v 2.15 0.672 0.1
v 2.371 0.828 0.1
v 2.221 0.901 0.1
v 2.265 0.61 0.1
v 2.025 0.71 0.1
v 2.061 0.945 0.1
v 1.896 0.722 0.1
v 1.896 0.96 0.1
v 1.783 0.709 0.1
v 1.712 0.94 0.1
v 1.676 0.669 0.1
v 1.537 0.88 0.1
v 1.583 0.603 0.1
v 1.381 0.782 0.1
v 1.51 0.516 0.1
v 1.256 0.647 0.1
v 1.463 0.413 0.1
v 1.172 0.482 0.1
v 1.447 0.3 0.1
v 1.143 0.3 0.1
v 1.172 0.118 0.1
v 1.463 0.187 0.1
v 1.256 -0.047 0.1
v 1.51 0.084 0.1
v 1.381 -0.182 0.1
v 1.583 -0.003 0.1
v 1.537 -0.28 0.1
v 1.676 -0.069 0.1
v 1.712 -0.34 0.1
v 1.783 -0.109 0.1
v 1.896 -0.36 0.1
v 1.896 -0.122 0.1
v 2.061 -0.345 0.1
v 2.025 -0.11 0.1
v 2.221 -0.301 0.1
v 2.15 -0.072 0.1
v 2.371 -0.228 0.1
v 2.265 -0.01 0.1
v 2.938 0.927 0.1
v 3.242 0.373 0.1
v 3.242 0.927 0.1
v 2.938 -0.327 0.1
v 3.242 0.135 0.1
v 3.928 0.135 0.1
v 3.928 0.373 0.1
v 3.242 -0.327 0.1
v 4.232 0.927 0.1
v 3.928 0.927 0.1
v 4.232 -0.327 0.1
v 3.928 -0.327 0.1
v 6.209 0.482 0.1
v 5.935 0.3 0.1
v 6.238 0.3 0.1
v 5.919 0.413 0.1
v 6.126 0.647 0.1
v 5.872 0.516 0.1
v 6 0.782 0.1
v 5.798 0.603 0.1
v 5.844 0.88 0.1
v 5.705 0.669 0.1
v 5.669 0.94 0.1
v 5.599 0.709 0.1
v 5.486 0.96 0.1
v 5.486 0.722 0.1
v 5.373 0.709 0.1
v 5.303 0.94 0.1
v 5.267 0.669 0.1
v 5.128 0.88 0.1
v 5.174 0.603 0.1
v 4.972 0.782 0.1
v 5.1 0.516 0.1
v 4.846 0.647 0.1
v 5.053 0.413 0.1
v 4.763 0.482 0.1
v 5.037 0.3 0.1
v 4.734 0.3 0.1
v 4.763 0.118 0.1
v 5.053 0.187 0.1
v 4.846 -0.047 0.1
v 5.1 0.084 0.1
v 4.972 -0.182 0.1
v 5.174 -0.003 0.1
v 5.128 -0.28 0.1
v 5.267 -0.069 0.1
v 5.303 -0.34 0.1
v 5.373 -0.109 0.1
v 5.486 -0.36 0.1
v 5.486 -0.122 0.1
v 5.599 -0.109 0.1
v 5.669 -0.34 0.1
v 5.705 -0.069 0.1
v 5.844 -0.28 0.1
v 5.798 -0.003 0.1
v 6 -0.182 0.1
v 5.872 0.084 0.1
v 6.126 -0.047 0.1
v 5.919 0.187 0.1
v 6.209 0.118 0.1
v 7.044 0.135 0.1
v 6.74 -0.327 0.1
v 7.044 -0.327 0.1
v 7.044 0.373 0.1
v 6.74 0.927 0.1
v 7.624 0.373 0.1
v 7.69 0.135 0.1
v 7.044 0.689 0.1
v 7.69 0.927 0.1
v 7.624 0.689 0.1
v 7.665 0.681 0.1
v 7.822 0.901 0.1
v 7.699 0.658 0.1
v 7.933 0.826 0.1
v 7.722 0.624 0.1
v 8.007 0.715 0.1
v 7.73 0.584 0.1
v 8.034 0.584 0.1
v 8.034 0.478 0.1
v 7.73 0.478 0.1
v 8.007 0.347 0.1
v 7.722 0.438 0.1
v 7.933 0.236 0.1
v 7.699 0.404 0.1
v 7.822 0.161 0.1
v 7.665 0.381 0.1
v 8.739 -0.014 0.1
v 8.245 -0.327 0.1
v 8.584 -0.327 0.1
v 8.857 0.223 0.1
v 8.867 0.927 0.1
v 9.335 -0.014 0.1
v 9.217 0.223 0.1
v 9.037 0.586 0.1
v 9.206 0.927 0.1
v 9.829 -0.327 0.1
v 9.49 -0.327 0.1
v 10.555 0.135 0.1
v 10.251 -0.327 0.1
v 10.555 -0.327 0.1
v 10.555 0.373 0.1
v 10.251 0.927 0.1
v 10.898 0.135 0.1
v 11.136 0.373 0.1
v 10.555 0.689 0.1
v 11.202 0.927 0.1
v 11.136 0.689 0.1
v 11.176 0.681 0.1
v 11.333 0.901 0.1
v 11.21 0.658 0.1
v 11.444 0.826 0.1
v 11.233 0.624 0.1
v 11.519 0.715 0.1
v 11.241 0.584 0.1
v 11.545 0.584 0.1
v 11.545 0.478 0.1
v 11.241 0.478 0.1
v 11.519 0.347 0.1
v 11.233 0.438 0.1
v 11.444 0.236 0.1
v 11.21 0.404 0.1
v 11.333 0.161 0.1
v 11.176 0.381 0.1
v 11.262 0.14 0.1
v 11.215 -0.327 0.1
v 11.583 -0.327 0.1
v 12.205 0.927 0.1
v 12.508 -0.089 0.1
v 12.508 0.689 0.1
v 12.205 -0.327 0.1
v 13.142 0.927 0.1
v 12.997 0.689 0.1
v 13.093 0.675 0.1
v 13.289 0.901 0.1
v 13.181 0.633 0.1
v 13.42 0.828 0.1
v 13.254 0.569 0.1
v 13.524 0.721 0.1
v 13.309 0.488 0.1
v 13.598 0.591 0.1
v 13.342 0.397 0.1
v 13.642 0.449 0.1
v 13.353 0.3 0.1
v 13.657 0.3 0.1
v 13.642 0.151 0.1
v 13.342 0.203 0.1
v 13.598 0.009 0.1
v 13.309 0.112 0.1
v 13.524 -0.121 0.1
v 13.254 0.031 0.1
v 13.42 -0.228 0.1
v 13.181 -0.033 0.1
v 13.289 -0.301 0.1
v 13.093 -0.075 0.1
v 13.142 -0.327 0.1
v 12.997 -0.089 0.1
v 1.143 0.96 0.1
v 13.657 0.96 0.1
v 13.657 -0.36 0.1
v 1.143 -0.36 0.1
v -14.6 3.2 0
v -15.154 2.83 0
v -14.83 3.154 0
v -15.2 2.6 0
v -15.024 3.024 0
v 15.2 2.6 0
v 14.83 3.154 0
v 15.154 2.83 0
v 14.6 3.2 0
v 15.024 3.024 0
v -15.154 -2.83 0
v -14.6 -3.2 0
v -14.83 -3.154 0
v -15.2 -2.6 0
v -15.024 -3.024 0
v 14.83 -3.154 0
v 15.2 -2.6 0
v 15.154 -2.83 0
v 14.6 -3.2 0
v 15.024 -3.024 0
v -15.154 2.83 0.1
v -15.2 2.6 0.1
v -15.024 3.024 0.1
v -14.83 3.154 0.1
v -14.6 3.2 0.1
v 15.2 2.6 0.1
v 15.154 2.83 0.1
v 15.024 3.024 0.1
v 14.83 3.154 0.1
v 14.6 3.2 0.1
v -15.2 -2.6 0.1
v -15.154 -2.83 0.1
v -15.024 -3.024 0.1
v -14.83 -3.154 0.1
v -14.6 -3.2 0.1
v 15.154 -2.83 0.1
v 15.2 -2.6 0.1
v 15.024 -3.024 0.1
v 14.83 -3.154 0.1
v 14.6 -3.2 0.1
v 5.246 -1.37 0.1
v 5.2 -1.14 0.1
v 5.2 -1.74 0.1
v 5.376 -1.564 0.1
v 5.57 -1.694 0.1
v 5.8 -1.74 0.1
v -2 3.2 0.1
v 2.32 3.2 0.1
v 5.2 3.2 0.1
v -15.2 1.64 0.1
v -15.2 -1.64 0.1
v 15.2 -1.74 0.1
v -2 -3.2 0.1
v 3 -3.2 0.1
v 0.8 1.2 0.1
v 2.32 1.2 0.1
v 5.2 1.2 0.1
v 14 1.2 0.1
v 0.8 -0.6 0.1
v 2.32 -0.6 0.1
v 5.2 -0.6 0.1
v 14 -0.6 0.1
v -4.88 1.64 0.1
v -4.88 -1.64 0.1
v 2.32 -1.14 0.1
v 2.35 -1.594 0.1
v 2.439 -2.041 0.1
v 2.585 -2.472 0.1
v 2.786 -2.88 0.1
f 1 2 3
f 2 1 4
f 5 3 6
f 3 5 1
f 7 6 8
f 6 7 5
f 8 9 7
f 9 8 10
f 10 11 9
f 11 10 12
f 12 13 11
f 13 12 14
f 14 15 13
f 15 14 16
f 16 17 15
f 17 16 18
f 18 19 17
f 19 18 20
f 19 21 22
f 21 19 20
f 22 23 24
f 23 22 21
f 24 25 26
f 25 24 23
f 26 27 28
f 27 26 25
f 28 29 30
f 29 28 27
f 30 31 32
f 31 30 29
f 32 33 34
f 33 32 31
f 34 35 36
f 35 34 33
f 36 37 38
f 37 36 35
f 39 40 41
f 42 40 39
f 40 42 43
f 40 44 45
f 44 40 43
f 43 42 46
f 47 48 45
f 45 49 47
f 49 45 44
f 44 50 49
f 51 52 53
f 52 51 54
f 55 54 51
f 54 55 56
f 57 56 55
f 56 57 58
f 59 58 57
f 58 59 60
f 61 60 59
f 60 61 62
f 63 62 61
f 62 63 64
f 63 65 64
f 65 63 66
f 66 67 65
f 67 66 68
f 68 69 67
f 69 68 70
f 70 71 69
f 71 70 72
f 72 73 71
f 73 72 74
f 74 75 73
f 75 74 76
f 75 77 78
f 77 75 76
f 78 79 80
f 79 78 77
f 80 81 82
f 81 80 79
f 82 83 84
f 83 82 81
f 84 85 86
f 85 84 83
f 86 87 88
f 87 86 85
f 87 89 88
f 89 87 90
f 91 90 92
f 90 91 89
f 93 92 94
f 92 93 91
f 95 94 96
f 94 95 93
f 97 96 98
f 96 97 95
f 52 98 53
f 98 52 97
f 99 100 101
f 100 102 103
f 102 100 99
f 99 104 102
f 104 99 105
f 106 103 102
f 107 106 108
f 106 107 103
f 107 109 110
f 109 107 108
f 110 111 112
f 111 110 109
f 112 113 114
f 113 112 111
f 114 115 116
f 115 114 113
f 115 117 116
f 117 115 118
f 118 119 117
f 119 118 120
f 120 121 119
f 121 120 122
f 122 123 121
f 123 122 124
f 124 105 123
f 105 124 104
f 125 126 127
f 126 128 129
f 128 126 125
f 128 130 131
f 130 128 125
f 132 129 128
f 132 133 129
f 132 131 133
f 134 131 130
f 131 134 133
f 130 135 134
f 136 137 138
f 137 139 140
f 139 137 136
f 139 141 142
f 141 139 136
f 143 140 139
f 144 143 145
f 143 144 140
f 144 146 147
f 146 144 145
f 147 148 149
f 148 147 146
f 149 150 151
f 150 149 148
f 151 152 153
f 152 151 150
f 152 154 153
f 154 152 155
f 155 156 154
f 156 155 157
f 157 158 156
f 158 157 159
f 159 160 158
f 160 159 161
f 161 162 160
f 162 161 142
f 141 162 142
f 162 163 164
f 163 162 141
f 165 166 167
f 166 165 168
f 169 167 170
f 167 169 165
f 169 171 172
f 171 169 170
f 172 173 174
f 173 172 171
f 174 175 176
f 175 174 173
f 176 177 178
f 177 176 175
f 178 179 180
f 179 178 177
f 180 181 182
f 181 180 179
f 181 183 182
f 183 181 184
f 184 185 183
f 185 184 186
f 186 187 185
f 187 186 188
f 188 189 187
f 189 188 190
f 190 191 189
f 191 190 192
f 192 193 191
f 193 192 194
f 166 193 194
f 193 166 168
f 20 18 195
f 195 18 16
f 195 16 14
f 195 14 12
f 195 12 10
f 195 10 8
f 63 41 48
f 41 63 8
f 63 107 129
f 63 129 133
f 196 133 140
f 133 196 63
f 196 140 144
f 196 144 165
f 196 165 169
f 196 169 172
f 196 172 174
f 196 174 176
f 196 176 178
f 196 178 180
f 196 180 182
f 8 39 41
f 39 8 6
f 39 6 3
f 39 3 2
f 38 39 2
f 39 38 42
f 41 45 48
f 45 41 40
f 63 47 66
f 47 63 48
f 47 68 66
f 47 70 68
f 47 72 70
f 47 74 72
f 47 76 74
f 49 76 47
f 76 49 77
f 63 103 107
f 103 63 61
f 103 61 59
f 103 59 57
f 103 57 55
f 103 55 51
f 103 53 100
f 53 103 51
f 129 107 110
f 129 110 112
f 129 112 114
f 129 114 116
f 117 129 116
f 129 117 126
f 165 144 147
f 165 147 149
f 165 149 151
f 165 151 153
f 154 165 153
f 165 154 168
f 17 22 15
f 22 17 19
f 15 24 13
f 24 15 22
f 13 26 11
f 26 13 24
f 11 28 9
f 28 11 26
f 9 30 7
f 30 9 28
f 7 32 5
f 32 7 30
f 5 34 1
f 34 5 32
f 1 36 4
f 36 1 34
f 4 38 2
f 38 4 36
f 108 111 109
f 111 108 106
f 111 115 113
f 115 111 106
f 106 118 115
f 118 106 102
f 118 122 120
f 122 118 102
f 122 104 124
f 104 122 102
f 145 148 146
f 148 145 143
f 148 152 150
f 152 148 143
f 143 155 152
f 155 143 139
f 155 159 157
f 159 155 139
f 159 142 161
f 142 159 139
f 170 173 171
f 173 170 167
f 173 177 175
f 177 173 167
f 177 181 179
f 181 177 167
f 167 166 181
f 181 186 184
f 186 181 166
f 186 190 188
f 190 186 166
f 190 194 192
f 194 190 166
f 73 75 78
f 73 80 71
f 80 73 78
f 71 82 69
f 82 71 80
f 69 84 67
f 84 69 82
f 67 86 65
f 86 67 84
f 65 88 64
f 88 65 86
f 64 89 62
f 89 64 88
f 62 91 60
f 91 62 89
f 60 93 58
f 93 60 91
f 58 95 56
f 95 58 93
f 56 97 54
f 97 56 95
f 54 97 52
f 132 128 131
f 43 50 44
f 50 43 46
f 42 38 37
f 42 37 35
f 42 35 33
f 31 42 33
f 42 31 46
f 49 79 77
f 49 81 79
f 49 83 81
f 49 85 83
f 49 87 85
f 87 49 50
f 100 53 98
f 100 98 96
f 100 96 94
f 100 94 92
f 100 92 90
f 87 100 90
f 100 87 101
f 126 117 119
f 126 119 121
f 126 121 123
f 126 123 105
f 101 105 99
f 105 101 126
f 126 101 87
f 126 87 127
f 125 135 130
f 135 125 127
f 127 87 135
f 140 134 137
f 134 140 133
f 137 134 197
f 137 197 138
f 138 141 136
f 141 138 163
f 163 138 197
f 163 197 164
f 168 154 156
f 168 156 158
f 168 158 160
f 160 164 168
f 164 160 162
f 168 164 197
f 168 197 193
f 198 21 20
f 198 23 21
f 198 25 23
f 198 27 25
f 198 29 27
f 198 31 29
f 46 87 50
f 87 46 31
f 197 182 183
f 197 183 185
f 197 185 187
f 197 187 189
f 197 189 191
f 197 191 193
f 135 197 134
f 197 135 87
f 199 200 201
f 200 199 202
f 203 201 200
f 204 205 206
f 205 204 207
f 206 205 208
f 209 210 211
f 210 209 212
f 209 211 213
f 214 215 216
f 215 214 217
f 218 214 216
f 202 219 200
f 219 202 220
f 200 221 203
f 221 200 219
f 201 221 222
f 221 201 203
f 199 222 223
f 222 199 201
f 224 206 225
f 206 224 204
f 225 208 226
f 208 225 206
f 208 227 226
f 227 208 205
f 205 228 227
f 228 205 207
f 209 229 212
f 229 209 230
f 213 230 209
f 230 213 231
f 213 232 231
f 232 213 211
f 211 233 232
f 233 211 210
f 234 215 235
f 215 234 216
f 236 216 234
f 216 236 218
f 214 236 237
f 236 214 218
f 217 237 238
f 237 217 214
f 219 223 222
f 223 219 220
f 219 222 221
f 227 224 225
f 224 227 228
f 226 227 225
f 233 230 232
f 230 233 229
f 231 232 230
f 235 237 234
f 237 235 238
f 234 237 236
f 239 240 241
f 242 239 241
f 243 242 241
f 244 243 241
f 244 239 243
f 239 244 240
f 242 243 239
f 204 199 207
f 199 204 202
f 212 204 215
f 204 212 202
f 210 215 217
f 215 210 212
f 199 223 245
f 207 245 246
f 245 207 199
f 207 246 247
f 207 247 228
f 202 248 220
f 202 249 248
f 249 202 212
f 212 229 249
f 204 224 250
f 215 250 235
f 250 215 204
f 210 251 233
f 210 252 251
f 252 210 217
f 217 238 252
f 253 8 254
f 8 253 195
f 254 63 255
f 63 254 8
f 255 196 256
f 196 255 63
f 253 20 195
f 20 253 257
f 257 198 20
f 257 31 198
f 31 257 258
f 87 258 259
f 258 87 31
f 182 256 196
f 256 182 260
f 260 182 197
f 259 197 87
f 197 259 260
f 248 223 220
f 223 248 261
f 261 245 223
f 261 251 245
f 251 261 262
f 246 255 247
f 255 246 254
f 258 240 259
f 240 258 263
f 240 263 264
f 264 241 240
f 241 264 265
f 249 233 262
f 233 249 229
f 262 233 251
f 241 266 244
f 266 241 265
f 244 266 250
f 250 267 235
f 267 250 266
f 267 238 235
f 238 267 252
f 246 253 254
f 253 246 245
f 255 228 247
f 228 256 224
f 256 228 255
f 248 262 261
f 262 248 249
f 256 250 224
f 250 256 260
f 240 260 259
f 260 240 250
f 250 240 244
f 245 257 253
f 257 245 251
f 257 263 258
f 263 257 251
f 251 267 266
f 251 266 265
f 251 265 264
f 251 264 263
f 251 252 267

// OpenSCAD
// file: ../p/1-4ndis.scad
use <../lib.scad>
function ldraw_lib__1_4ndis() = [
// 0 Disc Negative 0.25
// 0 Name: 1-4ndis.dat
// 0 Author: James Jessiman
// 0 !LDRAW_ORG Primitive UPDATE 2012-01
// 0 !LICENSE Licensed under CC BY 4.0 : see CAreadme.txt
// 
// 0 BFC CERTIFY CCW
  [0,"BFC","CERTIFY"],
  [0,"BFC","CCW"],
// 
// 0 !HISTORY 2002-03-23 [sbliss] Added BFC Statement
// 0 !HISTORY 2002-04-25 [PTadmin] Official Update 2002-02
// 0 !HISTORY 2007-06-22 [PTadmin] Header formatted for Contributor Agreement
// 0 !HISTORY 2008-07-01 [PTadmin] Official Update 2008-01
// 0 !HISTORY 2012-02-16 [Philo] Changed to CCW
// 0 !HISTORY 2012-03-30 [PTadmin] Official Update 2012-01
// 
// 
// 3 16 0.9239 0 0.3827 1 0 0 1 0 1
  [3,16,0.9239,0,0.3827,1,0,0,1,0,1],
// 3 16 0.7071 0 0.7071 0.9239 0 0.3827 1 0 1
  [3,16,0.7071,0,0.7071,0.9239,0,0.3827,1,0,1],
// 3 16 0.3827 0 0.9239 0.7071 0 0.7071 1 0 1
  [3,16,0.3827,0,0.9239,0.7071,0,0.7071,1,0,1],
// 3 16 0 0 1 0.3827 0 0.9239 1 0 1
  [3,16,0,0,1,0.3827,0,0.9239,1,0,1],
];
module ldraw_lib__1_4ndis(step=0, col=false, unit=2/5, alt=false, line=0.2, solid=!$preview)
    makepoly(ldraw_lib__1_4ndis(), step=step, col=col, unit=unit, alt=alt, line=line, solid=solid);
ldraw_lib__1_4ndis(line=0.2);
// file: ../p/1-4cyli.scad
use <../lib.scad>
function ldraw_lib__1_4cyli() = [
// 0 Cylinder 0.25
// 0 Name: 1-4cyli.dat
// 0 Author: James Jessiman
// 0 !LDRAW_ORG Primitive UPDATE 2012-01
// 0 !LICENSE Licensed under CC BY 4.0 : see CAreadme.txt
// 
// 0 BFC CERTIFY CCW
  [0,"BFC","CERTIFY"],
  [0,"BFC","CCW"],
// 
// 0 !HISTORY 2002-03-23 [sbliss] Added BFC statement.
// 0 !HISTORY 2002-04-25 [PTadmin] Official Update 2002-02
// 0 !HISTORY 2007-06-22 [PTadmin] Header formatted for Contributor Agreement
// 0 !HISTORY 2008-07-01 [PTadmin] Official Update 2008-01
// 0 !HISTORY 2012-02-16 [Philo] Changed to CCW
// 0 !HISTORY 2012-03-30 [PTadmin] Official Update 2012-01
// 
// 
// 4 16 1 1 0 0.9239 1 0.3827 0.9239 0 0.3827 1 0 0
  [4,16,1,1,0,0.9239,1,0.3827,0.9239,0,0.3827,1,0,0],
// 5 24 1 0 0 1 1 0 0.9239 0 0.3827 1 0 -1
  [5,24,1,0,0,1,1,0,0.9239,0,0.3827,1,0,-1],
// 4 16 0.9239 1 0.3827 0.7071 1 0.7071 0.7071 0 0.7071 0.9239 0 0.3827
  [4,16,0.9239,1,0.3827,0.7071,1,0.7071,0.7071,0,0.7071,0.9239,0,0.3827],
// 5 24 0.9239 0 0.3827 0.9239 1 0.3827 0.7071 0 0.7071 1 0 0
  [5,24,0.9239,0,0.3827,0.9239,1,0.3827,0.7071,0,0.7071,1,0,0],
// 4 16 0.7071 1 0.7071 0.3827 1 0.9239 0.3827 0 0.9239 0.7071 0 0.7071
  [4,16,0.7071,1,0.7071,0.3827,1,0.9239,0.3827,0,0.9239,0.7071,0,0.7071],
// 5 24 0.7071 0 0.7071 0.7071 1 0.7071 0.3827 0 0.9239 0.9239 0 0.3827
  [5,24,0.7071,0,0.7071,0.7071,1,0.7071,0.3827,0,0.9239,0.9239,0,0.3827],
// 4 16 0.3827 1 0.9239 0 1 1 0 0 1 0.3827 0 0.9239
  [4,16,0.3827,1,0.9239,0,1,1,0,0,1,0.3827,0,0.9239],
// 5 24 0.3827 0 0.9239 0.3827 1 0.9239 0 0 1 0.7071 0 0.7071
  [5,24,0.3827,0,0.9239,0.3827,1,0.9239,0,0,1,0.7071,0,0.7071],
// 5 24 0 0 1 0 1 1 0.3827 0 0.9239 -1 0 1
  [5,24,0,0,1,0,1,1,0.3827,0,0.9239,-1,0,1],
];
module ldraw_lib__1_4cyli(step=0, col=false, unit=2/5, alt=false, line=0.2, solid=!$preview)
    makepoly(ldraw_lib__1_4cyli(), step=step, col=col, unit=unit, alt=alt, line=line, solid=solid);
ldraw_lib__1_4cyli(line=0.2);
// file: ../p/1-4chrd.scad
use <../lib.scad>
function ldraw_lib__1_4chrd() = [
// 0 Chord 0.25
// 0 Name: 1-4chrd.dat
// 0 Author: Max Martin Richter [MMR1988]
// 0 !LDRAW_ORG Primitive UPDATE 2023-05
// 0 !LICENSE Licensed under CC BY 4.0 : see CAreadme.txt
// 
// 0 BFC CERTIFY CCW
  [0,"BFC","CERTIFY"],
  [0,"BFC","CCW"],
// 
// 0 !HISTORY 2004-04-22 [PTadmin] Official Update 2004-02
// 0 !HISTORY 2007-10-09 [PTadmin] Header formatted for Contributor Agreement
// 0 !HISTORY 2008-07-01 [PTadmin] Official Update 2008-01
// 0 !HISTORY 2012-08-02 [MMR1988] Re-creation with PrimGen2 and Rectifier
// 0 !HISTORY 2012-08-09 [PTadmin] Official Update 2012-02
// 0 !HISTORY 2023-10-27 [OrionP] Change author to MMR1988 from hafhead
// 0 !HISTORY 2023-10-31 [OrionP] Official Update 2023-05
// 
// 4 16 0.9239 0 0.3827 0.3827 0 0.9239 0 0 1 1 0 0
  [4,16,0.9239,0,0.3827,0.3827,0,0.9239,0,0,1,1,0,0],
// 3 16 0.7071 0 0.7071 0.3827 0 0.9239 0.9239 0 0.3827
  [3,16,0.7071,0,0.7071,0.3827,0,0.9239,0.9239,0,0.3827],
];
module ldraw_lib__1_4chrd(step=0, col=false, unit=2/5, alt=false, line=0.2, solid=!$preview)
    makepoly(ldraw_lib__1_4chrd(), step=step, col=col, unit=unit, alt=alt, line=line, solid=solid);
ldraw_lib__1_4chrd(line=0.2);
// main file
use <../lib.scad>
use <../p/1-4chrd.scad>
use <../p/1-4cyli.scad>
use <../p/1-4ndis.scad>
use <../p/logo-chopard-box.scad>
use <../p/logo-chopard-text.scad>
function ldraw_lib__6148328an() = [
// 0 Sticker  0.8 x  3.8 with White "CHOPARD" and Dark Grey Lines on White Background Right
// 0 Name: 6148328an.dat
// 0 Author: Massimo Maso [Sirio]
// 0 !LDRAW_ORG Part UPDATE 2024-08
// 0 !LICENSE Licensed under CC BY 4.0 : see CAreadme.txt
// 
// 0 BFC CERTIFY CCW
  [0,"BFC","CERTIFY"],
  [0,"BFC","CCW"],
// 
// 0 !KEYWORDS 919, Bricklink 75876stk01, Brickowl 852010, Hybrid, Pit Lane
// 0 !KEYWORDS Porsche, Rebrickable 26357, set 75876, Speed Champions
// 
// 0 !HISTORY 2024-09-30 [OrionP] Official Update 2024-08
// 
// 0 // Logo primitives
// 1 15 18.5 -.25 .75 .33 0 0 0 1 0 0 0 .33 logo-chopard-text.dat
  [1,15,18.5,-.25,.75,.33,0,0,0,1,0,0,0,.33, ldraw_lib__logo_chopard_text()],
// 1 0 18.5 -.25 .75 .33 0 0 0 1 0 0 0 .33 logo-chopard-box.dat
  [1,0,18.5,-.25,.75,.33,0,0,0,1,0,0,0,.33, ldraw_lib__logo_chopard_box()],
// 0 // Primitives
// 1 16 -36.5 0 6.5 -1.5 0 0 0 -1 0 0 0 1.5 1-4chrd.dat
  [1,16,-36.5,0,6.5,-1.5,0,0,0,-1,0,0,0,1.5, ldraw_lib__1_4chrd()],
// 1 16 36.5 0 6.5 1.5 0 0 0 -1 0 0 0 1.5 1-4chrd.dat
  [1,16,36.5,0,6.5,1.5,0,0,0,-1,0,0,0,1.5, ldraw_lib__1_4chrd()],
// 1 16 -36.5 0 -6.5 -1.5 0 0 0 -1 0 0 0 -1.5 1-4chrd.dat
  [1,16,-36.5,0,-6.5,-1.5,0,0,0,-1,0,0,0,-1.5, ldraw_lib__1_4chrd()],
// 1 16 36.5 0 -6.5 1.5 0 0 0 -1 0 0 0 -1.5 1-4chrd.dat
  [1,16,36.5,0,-6.5,1.5,0,0,0,-1,0,0,0,-1.5, ldraw_lib__1_4chrd()],
// 1 16 -36.5 0 6.5 -1.5 0 0 0 -.25 0 0 0 1.5 1-4cyli.dat
  [1,16,-36.5,0,6.5,-1.5,0,0,0,-.25,0,0,0,1.5, ldraw_lib__1_4cyli()],
// 1 16 36.5 0 6.5 1.5 0 0 0 -.25 0 0 0 1.5 1-4cyli.dat
  [1,16,36.5,0,6.5,1.5,0,0,0,-.25,0,0,0,1.5, ldraw_lib__1_4cyli()],
// 1 16 -36.5 0 -6.5 -1.5 0 0 0 -.25 0 0 0 -1.5 1-4cyli.dat
  [1,16,-36.5,0,-6.5,-1.5,0,0,0,-.25,0,0,0,-1.5, ldraw_lib__1_4cyli()],
// 1 16 36.5 0 -6.5 1.5 0 0 0 -.25 0 0 0 -1.5 1-4cyli.dat
  [1,16,36.5,0,-6.5,1.5,0,0,0,-.25,0,0,0,-1.5, ldraw_lib__1_4cyli()],
// 1 72 -36.5 -.25 6.5 -1.5 0 0 0 1 0 0 0 1.5 1-4chrd.dat
  [1,72,-36.5,-.25,6.5,-1.5,0,0,0,1,0,0,0,1.5, ldraw_lib__1_4chrd()],
// 1 15 36.5 -.25 6.5 1.5 0 0 0 1 0 0 0 1.5 1-4chrd.dat
  [1,15,36.5,-.25,6.5,1.5,0,0,0,1,0,0,0,1.5, ldraw_lib__1_4chrd()],
// 1 72 -36.5 -.25 -6.5 -1.5 0 0 0 1 0 0 0 -1.5 1-4chrd.dat
  [1,72,-36.5,-.25,-6.5,-1.5,0,0,0,1,0,0,0,-1.5, ldraw_lib__1_4chrd()],
// 1 72 36.5 -.25 -6.5 1.5 0 0 0 1 0 0 0 -1.5 1-4chrd.dat
  [1,72,36.5,-.25,-6.5,1.5,0,0,0,1,0,0,0,-1.5, ldraw_lib__1_4chrd()],
// 1 72 14.5 -.25 -2.85 -1.5 0 0 0 1 0 0 0 -1.5 1-4ndis.dat
  [1,72,14.5,-.25,-2.85,-1.5,0,0,0,1,0,0,0,-1.5, ldraw_lib__1_4ndis()],
// 1 15 14.5 -.25 -2.85 -1.5 0 0 0 1 0 0 0 -1.5 1-4chrd.dat
  [1,15,14.5,-.25,-2.85,-1.5,0,0,0,1,0,0,0,-1.5, ldraw_lib__1_4chrd()],
// 0 // Bottom faces
// 4 16 36.5 0 8 38 0 6.5 -38 0 6.5 -36.5 0 8
  [4,16,36.5,0,8,38,0,6.5,-38,0,6.5,-36.5,0,8],
// 4 16 38 0 6.5 38 0 -6.5 -38 0 -6.5 -38 0 6.5
  [4,16,38,0,6.5,38,0,-6.5,-38,0,-6.5,-38,0,6.5],
// 4 16 36.5 0 -8 -36.5 0 -8 -38 0 -6.5 38 0 -6.5
  [4,16,36.5,0,-8,-36.5,0,-8,-38,0,-6.5,38,0,-6.5],
// 0 // Lateral faces
// 3 16 -36.5 0 8 -36.5 -.25 8 -5 -.25 8
  [3,16,-36.5,0,8,-36.5,-.25,8,-5,-.25,8],
// 4 16 -36.5 0 8 -5 -.25 8 5.8 -.25 8 36.5 0 8
  [4,16,-36.5,0,8,-5,-.25,8,5.8,-.25,8,36.5,0,8],
// 3 16 36.5 0 8 5.8 -.25 8 13 -.25 8
  [3,16,36.5,0,8,5.8,-.25,8,13,-.25,8],
// 3 16 36.5 0 8 13 -.25 8 36.5 -.25 8
  [3,16,36.5,0,8,13,-.25,8,36.5,-.25,8],
// 3 16 -38 0 6.5 -38 -.25 4.1 -38 -.25 6.5
  [3,16,-38,0,6.5,-38,-.25,4.1,-38,-.25,6.5],
// 4 16 -38 0 6.5 -38 0 -6.5 -38 -.25 -4.1 -38 -.25 4.1
  [4,16,-38,0,6.5,-38,0,-6.5,-38,-.25,-4.1,-38,-.25,4.1],
// 3 16 -38 0 -6.5 -38 -.25 -6.5 -38 -.25 -4.1
  [3,16,-38,0,-6.5,-38,-.25,-6.5,-38,-.25,-4.1],
// 3 16 38 0 6.5 38 -.25 6.5 38 -.25 -4.35
  [3,16,38,0,6.5,38,-.25,6.5,38,-.25,-4.35],
// 4 16 38 0 6.5 38 -.25 -4.35 38 -.25 -6.5 38 0 -6.5
  [4,16,38,0,6.5,38,-.25,-4.35,38,-.25,-6.5,38,0,-6.5],
// 3 16 -36.5 0 -8 -5 -.25 -8 -36.5 -.25 -8
  [3,16,-36.5,0,-8,-5,-.25,-8,-36.5,-.25,-8],
// 4 16 -36.5 0 -8 36.5 0 -8 7.4996 -.25 -8 -5 -.25 -8
  [4,16,-36.5,0,-8,36.5,0,-8,7.4996,-.25,-8,-5,-.25,-8],
// 3 16 36.5 0 -8 36.5 -.25 -8 7.4996 -.25 -8
  [3,16,36.5,0,-8,36.5,-.25,-8,7.4996,-.25,-8],
// 0 // Top faces
// 0 // Black frame
// 4 0 5.8 -.25 3 2 -.25 3 2.858 -.25 2.4 4.739 -.25 2.4
  [4,0,5.8,-.25,3,2,-.25,3,2.858,-.25,2.4,4.739,-.25,2.4],
// 4 0 5.8 -.25 3 4.739 -.25 2.4 13.715 -.25 2.4 13 -.25 3
  [4,0,5.8,-.25,3,4.739,-.25,2.4,13.715,-.25,2.4,13,-.25,3],
// 4 0 13 -.25 3 13.715 -.25 2.4 34.142 -.25 2.4 35 -.25 3
  [4,0,13,-.25,3,13.715,-.25,2.4,34.142,-.25,2.4,35,-.25,3],
// 4 0 2 -.25 -1.5 2.858 -.25 .75 2.858 -.25 2.4 2 -.25 3
  [4,0,2,-.25,-1.5,2.858,-.25,.75,2.858,-.25,2.4,2,-.25,3],
// 3 0 2 -.25 -1.5 2.858 -.25 -.9 2.858 -.25 .75
  [3,0,2,-.25,-1.5,2.858,-.25,-.9,2.858,-.25,.75],
// 4 0 2 -.25 -1.5 5.8 -.25 -1.5 4.739 -.25 -.9 2.858 -.25 -.9
  [4,0,2,-.25,-1.5,5.8,-.25,-1.5,4.739,-.25,-.9,2.858,-.25,-.9],
// 4 0 5.8 -.25 -1.5 13 -.25 -1.5 13.715 -.25 -.9 4.739 -.25 -.9
  [4,0,5.8,-.25,-1.5,13,-.25,-1.5,13.715,-.25,-.9,4.739,-.25,-.9],
// 4 0 35 -.25 -1.5 35 -.25 3 34.142 -.25 2.4 34.142 -.25 .75
  [4,0,35,-.25,-1.5,35,-.25,3,34.142,-.25,2.4,34.142,-.25,.75],
// 3 0 35 -.25 -1.5 34.142 -.25 .75 34.142 -.25 -.9
  [3,0,35,-.25,-1.5,34.142,-.25,.75,34.142,-.25,-.9],
// 4 0 35 -.25 -1.5 34.142 -.25 -.9 13.715 -.25 -.9 13 -.25 -1.5
  [4,0,35,-.25,-1.5,34.142,-.25,-.9,13.715,-.25,-.9,13,-.25,-1.5],
// 0 // Dark grey faces
// 4 72 -12.2 -.25 4.1 -36.5 -.25 8 -38 -.25 6.5 -38 -.25 4.1
  [4,72,-12.2,-.25,4.1,-36.5,-.25,8,-38,-.25,6.5,-38,-.25,4.1],
// 3 72 -12.2 -.25 4.1 -5 -.25 8 -36.5 -.25 8
  [3,72,-12.2,-.25,4.1,-5,-.25,8,-36.5,-.25,8],
// 4 72 -12.2 -.25 4.1 -12.2 -.25 -4.1 -5 -.25 -8 -5 -.25 8
  [4,72,-12.2,-.25,4.1,-12.2,-.25,-4.1,-5,-.25,-8,-5,-.25,8],
// 4 72 5.8 -.25 3 13 -.25 3 13 -.25 8 5.8 -.25 8
  [4,72,5.8,-.25,3,13,-.25,3,13,-.25,8,5.8,-.25,8],
// 4 72 13 -.25 -2.85 13 -.25 -1.5 5.8 -.25 -1.5 5.8 -.25 -2.85
  [4,72,13,-.25,-2.85,13,-.25,-1.5,5.8,-.25,-1.5,5.8,-.25,-2.85],
// 3 72 13 -.25 -2.85 5.8 -.25 -2.85 5.8748 -.25 -3.9854
  [3,72,13,-.25,-2.85,5.8,-.25,-2.85,5.8748,-.25,-3.9854],
// 4 72 13 -.25 -2.85 5.8748 -.25 -3.9854 6.0967 -.25 -5.1016 13 -.25 -4.35
  [4,72,13,-.25,-2.85,5.8748,-.25,-3.9854,6.0967,-.25,-5.1016,13,-.25,-4.35],
// 4 72 -12.2 -.25 -4.1 -38 -.25 -4.1 -38 -.25 -6.5 -36.5 -.25 -8
  [4,72,-12.2,-.25,-4.1,-38,-.25,-4.1,-38,-.25,-6.5,-36.5,-.25,-8],
// 3 72 -12.2 -.25 -4.1 -36.5 -.25 -8 -5 -.25 -8
  [3,72,-12.2,-.25,-4.1,-36.5,-.25,-8,-5,-.25,-8],
// 4 72 14.5 -.25 -4.35 13 -.25 -4.35 6.0967 -.25 -5.1016 6.4621 -.25 -6.1795
  [4,72,14.5,-.25,-4.35,13,-.25,-4.35,6.0967,-.25,-5.1016,6.4621,-.25,-6.1795],
// 3 72 14.5 -.25 -4.35 6.4621 -.25 -6.1795 38 -.25 -4.35
  [3,72,14.5,-.25,-4.35,6.4621,-.25,-6.1795,38,-.25,-4.35],
// 4 72 38 -.25 -6.5 38 -.25 -4.35 6.4621 -.25 -6.1795 6.9658 -.25 -7.2
  [4,72,38,-.25,-6.5,38,-.25,-4.35,6.4621,-.25,-6.1795,6.9658,-.25,-7.2],
// 4 72 38 -.25 -6.5 6.9658 -.25 -7.2 7.4996 -.25 -8 36.5 -.25 -8
  [4,72,38,-.25,-6.5,6.9658,-.25,-7.2,7.4996,-.25,-8,36.5,-.25,-8],
// 0 // White faces
// 4 15 5.8 -.25 3 5.8 -.25 8 -5 -.25 8 2 -.25 3
  [4,15,5.8,-.25,3,5.8,-.25,8,-5,-.25,8,2,-.25,3],
// 3 15 13 -.25 3 36.5 -.25 8 13 -.25 8
  [3,15,13,-.25,3,36.5,-.25,8,13,-.25,8],
// 4 15 13 -.25 3 35 -.25 3 38 -.25 6.5 36.5 -.25 8
  [4,15,13,-.25,3,35,-.25,3,38,-.25,6.5,36.5,-.25,8],
// 4 15 -12.2 -.25 4.1 -38 -.25 4.1 -38 -.25 -4.1 -12.2 -.25 -4.1
  [4,15,-12.2,-.25,4.1,-38,-.25,4.1,-38,-.25,-4.1,-12.2,-.25,-4.1],
// 4 15 38 -.25 -4.35 38 -.25 6.5 35 -.25 3 35 -.25 -1.5
  [4,15,38,-.25,-4.35,38,-.25,6.5,35,-.25,3,35,-.25,-1.5],
// 4 15 38 -.25 -4.35 35 -.25 -1.5 13 -.25 -1.5 13 -.25 -2.85
  [4,15,38,-.25,-4.35,35,-.25,-1.5,13,-.25,-1.5,13,-.25,-2.85],
// 3 15 38 -.25 -4.35 13 -.25 -2.85 14.5 -.25 -4.35
  [3,15,38,-.25,-4.35,13,-.25,-2.85,14.5,-.25,-4.35],
// 4 15 -5 -.25 -8 2 -.25 -1.5 2 -.25 3 -5 -.25 8
  [4,15,-5,-.25,-8,2,-.25,-1.5,2,-.25,3,-5,-.25,8],
// 4 15 -5 -.25 -8 5.8 -.25 -2.85 5.8 -.25 -1.5 2 -.25 -1.5
  [4,15,-5,-.25,-8,5.8,-.25,-2.85,5.8,-.25,-1.5,2,-.25,-1.5],
// 3 15 -5 -.25 -8 6.9658 -.25 -7.2 6.4621 -.25 -6.1795
  [3,15,-5,-.25,-8,6.9658,-.25,-7.2,6.4621,-.25,-6.1795],
// 3 15 -5 -.25 -8 6.4621 -.25 -6.1795 6.0967 -.25 -5.1016
  [3,15,-5,-.25,-8,6.4621,-.25,-6.1795,6.0967,-.25,-5.1016],
// 3 15 -5 -.25 -8 6.0967 -.25 -5.1016 5.8748 -.25 -3.9854
  [3,15,-5,-.25,-8,6.0967,-.25,-5.1016,5.8748,-.25,-3.9854],
// 3 15 -5 -.25 -8 5.8748 -.25 -3.9854 5.8 -.25 -2.85
  [3,15,-5,-.25,-8,5.8748,-.25,-3.9854,5.8,-.25,-2.85],
// 3 15 -5 -.25 -8 7.4996 -.25 -8 6.9658 -.25 -7.2
  [3,15,-5,-.25,-8,7.4996,-.25,-8,6.9658,-.25,-7.2],
];
module ldraw_lib__6148328an(step=0, col=false, unit=2/5, alt=false, line=0.2, solid=!$preview)
    makepoly(ldraw_lib__6148328an(), step=step, col=col, unit=unit, alt=alt, line=line, solid=solid);
ldraw_lib__6148328an(line=0.2);
